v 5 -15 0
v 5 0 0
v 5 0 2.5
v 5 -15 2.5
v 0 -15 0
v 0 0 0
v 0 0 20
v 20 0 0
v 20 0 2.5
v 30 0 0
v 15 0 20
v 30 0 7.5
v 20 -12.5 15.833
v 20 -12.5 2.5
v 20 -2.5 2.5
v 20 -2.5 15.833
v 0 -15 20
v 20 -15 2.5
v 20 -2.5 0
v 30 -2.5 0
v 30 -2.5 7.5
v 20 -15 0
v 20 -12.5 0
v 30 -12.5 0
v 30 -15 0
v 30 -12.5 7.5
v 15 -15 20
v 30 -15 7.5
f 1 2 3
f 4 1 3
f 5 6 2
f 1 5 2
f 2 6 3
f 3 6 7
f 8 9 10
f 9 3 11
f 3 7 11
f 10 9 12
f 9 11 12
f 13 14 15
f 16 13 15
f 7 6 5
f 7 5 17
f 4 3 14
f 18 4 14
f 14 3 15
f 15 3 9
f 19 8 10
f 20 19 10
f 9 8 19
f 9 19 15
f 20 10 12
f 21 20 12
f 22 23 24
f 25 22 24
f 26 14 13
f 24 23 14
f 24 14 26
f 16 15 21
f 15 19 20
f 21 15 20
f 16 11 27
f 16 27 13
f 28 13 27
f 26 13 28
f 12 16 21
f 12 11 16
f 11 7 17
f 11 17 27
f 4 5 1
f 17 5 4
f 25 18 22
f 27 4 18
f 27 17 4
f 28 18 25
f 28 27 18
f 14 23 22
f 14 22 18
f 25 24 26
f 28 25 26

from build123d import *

# Parameters (mm, degrees)
F0_W     = 30
F0_H     = 20
F1_DEPTH = 15
F2_W     = 15
F2_H     = 2.5
F3_DEPTH = 15.001
F4_W     = 10
F4_H     = 10
F5_DEPTH = 20.001


with BuildPart() as f1:
    # F0 (on Front) → F1 (new body)
    with BuildSketch(Plane.XZ):
        with Locations((15, 10)):
            Rectangle(F0_W, F0_H)
    extrude(amount=F1_DEPTH)

    # F2 (on Front) → F3 (cut, through all)
    with BuildSketch(Plane.XZ):
        with Locations((12.5, 1.25)):
            Rectangle(F2_W, F2_H)
        Polygon((30, 20), (15, 20), (30, 7.5), align=None)
    extrude(amount=F3_DEPTH, mode=Mode.SUBTRACT)

    # F4 (on Top) → F5 (cut, through all)
    with BuildSketch(Plane.XY):
        with Locations((25, -7.5)):
            Rectangle(F4_W, F4_H)
    extrude(amount=F5_DEPTH, mode=Mode.SUBTRACT)


solid = f1.part
